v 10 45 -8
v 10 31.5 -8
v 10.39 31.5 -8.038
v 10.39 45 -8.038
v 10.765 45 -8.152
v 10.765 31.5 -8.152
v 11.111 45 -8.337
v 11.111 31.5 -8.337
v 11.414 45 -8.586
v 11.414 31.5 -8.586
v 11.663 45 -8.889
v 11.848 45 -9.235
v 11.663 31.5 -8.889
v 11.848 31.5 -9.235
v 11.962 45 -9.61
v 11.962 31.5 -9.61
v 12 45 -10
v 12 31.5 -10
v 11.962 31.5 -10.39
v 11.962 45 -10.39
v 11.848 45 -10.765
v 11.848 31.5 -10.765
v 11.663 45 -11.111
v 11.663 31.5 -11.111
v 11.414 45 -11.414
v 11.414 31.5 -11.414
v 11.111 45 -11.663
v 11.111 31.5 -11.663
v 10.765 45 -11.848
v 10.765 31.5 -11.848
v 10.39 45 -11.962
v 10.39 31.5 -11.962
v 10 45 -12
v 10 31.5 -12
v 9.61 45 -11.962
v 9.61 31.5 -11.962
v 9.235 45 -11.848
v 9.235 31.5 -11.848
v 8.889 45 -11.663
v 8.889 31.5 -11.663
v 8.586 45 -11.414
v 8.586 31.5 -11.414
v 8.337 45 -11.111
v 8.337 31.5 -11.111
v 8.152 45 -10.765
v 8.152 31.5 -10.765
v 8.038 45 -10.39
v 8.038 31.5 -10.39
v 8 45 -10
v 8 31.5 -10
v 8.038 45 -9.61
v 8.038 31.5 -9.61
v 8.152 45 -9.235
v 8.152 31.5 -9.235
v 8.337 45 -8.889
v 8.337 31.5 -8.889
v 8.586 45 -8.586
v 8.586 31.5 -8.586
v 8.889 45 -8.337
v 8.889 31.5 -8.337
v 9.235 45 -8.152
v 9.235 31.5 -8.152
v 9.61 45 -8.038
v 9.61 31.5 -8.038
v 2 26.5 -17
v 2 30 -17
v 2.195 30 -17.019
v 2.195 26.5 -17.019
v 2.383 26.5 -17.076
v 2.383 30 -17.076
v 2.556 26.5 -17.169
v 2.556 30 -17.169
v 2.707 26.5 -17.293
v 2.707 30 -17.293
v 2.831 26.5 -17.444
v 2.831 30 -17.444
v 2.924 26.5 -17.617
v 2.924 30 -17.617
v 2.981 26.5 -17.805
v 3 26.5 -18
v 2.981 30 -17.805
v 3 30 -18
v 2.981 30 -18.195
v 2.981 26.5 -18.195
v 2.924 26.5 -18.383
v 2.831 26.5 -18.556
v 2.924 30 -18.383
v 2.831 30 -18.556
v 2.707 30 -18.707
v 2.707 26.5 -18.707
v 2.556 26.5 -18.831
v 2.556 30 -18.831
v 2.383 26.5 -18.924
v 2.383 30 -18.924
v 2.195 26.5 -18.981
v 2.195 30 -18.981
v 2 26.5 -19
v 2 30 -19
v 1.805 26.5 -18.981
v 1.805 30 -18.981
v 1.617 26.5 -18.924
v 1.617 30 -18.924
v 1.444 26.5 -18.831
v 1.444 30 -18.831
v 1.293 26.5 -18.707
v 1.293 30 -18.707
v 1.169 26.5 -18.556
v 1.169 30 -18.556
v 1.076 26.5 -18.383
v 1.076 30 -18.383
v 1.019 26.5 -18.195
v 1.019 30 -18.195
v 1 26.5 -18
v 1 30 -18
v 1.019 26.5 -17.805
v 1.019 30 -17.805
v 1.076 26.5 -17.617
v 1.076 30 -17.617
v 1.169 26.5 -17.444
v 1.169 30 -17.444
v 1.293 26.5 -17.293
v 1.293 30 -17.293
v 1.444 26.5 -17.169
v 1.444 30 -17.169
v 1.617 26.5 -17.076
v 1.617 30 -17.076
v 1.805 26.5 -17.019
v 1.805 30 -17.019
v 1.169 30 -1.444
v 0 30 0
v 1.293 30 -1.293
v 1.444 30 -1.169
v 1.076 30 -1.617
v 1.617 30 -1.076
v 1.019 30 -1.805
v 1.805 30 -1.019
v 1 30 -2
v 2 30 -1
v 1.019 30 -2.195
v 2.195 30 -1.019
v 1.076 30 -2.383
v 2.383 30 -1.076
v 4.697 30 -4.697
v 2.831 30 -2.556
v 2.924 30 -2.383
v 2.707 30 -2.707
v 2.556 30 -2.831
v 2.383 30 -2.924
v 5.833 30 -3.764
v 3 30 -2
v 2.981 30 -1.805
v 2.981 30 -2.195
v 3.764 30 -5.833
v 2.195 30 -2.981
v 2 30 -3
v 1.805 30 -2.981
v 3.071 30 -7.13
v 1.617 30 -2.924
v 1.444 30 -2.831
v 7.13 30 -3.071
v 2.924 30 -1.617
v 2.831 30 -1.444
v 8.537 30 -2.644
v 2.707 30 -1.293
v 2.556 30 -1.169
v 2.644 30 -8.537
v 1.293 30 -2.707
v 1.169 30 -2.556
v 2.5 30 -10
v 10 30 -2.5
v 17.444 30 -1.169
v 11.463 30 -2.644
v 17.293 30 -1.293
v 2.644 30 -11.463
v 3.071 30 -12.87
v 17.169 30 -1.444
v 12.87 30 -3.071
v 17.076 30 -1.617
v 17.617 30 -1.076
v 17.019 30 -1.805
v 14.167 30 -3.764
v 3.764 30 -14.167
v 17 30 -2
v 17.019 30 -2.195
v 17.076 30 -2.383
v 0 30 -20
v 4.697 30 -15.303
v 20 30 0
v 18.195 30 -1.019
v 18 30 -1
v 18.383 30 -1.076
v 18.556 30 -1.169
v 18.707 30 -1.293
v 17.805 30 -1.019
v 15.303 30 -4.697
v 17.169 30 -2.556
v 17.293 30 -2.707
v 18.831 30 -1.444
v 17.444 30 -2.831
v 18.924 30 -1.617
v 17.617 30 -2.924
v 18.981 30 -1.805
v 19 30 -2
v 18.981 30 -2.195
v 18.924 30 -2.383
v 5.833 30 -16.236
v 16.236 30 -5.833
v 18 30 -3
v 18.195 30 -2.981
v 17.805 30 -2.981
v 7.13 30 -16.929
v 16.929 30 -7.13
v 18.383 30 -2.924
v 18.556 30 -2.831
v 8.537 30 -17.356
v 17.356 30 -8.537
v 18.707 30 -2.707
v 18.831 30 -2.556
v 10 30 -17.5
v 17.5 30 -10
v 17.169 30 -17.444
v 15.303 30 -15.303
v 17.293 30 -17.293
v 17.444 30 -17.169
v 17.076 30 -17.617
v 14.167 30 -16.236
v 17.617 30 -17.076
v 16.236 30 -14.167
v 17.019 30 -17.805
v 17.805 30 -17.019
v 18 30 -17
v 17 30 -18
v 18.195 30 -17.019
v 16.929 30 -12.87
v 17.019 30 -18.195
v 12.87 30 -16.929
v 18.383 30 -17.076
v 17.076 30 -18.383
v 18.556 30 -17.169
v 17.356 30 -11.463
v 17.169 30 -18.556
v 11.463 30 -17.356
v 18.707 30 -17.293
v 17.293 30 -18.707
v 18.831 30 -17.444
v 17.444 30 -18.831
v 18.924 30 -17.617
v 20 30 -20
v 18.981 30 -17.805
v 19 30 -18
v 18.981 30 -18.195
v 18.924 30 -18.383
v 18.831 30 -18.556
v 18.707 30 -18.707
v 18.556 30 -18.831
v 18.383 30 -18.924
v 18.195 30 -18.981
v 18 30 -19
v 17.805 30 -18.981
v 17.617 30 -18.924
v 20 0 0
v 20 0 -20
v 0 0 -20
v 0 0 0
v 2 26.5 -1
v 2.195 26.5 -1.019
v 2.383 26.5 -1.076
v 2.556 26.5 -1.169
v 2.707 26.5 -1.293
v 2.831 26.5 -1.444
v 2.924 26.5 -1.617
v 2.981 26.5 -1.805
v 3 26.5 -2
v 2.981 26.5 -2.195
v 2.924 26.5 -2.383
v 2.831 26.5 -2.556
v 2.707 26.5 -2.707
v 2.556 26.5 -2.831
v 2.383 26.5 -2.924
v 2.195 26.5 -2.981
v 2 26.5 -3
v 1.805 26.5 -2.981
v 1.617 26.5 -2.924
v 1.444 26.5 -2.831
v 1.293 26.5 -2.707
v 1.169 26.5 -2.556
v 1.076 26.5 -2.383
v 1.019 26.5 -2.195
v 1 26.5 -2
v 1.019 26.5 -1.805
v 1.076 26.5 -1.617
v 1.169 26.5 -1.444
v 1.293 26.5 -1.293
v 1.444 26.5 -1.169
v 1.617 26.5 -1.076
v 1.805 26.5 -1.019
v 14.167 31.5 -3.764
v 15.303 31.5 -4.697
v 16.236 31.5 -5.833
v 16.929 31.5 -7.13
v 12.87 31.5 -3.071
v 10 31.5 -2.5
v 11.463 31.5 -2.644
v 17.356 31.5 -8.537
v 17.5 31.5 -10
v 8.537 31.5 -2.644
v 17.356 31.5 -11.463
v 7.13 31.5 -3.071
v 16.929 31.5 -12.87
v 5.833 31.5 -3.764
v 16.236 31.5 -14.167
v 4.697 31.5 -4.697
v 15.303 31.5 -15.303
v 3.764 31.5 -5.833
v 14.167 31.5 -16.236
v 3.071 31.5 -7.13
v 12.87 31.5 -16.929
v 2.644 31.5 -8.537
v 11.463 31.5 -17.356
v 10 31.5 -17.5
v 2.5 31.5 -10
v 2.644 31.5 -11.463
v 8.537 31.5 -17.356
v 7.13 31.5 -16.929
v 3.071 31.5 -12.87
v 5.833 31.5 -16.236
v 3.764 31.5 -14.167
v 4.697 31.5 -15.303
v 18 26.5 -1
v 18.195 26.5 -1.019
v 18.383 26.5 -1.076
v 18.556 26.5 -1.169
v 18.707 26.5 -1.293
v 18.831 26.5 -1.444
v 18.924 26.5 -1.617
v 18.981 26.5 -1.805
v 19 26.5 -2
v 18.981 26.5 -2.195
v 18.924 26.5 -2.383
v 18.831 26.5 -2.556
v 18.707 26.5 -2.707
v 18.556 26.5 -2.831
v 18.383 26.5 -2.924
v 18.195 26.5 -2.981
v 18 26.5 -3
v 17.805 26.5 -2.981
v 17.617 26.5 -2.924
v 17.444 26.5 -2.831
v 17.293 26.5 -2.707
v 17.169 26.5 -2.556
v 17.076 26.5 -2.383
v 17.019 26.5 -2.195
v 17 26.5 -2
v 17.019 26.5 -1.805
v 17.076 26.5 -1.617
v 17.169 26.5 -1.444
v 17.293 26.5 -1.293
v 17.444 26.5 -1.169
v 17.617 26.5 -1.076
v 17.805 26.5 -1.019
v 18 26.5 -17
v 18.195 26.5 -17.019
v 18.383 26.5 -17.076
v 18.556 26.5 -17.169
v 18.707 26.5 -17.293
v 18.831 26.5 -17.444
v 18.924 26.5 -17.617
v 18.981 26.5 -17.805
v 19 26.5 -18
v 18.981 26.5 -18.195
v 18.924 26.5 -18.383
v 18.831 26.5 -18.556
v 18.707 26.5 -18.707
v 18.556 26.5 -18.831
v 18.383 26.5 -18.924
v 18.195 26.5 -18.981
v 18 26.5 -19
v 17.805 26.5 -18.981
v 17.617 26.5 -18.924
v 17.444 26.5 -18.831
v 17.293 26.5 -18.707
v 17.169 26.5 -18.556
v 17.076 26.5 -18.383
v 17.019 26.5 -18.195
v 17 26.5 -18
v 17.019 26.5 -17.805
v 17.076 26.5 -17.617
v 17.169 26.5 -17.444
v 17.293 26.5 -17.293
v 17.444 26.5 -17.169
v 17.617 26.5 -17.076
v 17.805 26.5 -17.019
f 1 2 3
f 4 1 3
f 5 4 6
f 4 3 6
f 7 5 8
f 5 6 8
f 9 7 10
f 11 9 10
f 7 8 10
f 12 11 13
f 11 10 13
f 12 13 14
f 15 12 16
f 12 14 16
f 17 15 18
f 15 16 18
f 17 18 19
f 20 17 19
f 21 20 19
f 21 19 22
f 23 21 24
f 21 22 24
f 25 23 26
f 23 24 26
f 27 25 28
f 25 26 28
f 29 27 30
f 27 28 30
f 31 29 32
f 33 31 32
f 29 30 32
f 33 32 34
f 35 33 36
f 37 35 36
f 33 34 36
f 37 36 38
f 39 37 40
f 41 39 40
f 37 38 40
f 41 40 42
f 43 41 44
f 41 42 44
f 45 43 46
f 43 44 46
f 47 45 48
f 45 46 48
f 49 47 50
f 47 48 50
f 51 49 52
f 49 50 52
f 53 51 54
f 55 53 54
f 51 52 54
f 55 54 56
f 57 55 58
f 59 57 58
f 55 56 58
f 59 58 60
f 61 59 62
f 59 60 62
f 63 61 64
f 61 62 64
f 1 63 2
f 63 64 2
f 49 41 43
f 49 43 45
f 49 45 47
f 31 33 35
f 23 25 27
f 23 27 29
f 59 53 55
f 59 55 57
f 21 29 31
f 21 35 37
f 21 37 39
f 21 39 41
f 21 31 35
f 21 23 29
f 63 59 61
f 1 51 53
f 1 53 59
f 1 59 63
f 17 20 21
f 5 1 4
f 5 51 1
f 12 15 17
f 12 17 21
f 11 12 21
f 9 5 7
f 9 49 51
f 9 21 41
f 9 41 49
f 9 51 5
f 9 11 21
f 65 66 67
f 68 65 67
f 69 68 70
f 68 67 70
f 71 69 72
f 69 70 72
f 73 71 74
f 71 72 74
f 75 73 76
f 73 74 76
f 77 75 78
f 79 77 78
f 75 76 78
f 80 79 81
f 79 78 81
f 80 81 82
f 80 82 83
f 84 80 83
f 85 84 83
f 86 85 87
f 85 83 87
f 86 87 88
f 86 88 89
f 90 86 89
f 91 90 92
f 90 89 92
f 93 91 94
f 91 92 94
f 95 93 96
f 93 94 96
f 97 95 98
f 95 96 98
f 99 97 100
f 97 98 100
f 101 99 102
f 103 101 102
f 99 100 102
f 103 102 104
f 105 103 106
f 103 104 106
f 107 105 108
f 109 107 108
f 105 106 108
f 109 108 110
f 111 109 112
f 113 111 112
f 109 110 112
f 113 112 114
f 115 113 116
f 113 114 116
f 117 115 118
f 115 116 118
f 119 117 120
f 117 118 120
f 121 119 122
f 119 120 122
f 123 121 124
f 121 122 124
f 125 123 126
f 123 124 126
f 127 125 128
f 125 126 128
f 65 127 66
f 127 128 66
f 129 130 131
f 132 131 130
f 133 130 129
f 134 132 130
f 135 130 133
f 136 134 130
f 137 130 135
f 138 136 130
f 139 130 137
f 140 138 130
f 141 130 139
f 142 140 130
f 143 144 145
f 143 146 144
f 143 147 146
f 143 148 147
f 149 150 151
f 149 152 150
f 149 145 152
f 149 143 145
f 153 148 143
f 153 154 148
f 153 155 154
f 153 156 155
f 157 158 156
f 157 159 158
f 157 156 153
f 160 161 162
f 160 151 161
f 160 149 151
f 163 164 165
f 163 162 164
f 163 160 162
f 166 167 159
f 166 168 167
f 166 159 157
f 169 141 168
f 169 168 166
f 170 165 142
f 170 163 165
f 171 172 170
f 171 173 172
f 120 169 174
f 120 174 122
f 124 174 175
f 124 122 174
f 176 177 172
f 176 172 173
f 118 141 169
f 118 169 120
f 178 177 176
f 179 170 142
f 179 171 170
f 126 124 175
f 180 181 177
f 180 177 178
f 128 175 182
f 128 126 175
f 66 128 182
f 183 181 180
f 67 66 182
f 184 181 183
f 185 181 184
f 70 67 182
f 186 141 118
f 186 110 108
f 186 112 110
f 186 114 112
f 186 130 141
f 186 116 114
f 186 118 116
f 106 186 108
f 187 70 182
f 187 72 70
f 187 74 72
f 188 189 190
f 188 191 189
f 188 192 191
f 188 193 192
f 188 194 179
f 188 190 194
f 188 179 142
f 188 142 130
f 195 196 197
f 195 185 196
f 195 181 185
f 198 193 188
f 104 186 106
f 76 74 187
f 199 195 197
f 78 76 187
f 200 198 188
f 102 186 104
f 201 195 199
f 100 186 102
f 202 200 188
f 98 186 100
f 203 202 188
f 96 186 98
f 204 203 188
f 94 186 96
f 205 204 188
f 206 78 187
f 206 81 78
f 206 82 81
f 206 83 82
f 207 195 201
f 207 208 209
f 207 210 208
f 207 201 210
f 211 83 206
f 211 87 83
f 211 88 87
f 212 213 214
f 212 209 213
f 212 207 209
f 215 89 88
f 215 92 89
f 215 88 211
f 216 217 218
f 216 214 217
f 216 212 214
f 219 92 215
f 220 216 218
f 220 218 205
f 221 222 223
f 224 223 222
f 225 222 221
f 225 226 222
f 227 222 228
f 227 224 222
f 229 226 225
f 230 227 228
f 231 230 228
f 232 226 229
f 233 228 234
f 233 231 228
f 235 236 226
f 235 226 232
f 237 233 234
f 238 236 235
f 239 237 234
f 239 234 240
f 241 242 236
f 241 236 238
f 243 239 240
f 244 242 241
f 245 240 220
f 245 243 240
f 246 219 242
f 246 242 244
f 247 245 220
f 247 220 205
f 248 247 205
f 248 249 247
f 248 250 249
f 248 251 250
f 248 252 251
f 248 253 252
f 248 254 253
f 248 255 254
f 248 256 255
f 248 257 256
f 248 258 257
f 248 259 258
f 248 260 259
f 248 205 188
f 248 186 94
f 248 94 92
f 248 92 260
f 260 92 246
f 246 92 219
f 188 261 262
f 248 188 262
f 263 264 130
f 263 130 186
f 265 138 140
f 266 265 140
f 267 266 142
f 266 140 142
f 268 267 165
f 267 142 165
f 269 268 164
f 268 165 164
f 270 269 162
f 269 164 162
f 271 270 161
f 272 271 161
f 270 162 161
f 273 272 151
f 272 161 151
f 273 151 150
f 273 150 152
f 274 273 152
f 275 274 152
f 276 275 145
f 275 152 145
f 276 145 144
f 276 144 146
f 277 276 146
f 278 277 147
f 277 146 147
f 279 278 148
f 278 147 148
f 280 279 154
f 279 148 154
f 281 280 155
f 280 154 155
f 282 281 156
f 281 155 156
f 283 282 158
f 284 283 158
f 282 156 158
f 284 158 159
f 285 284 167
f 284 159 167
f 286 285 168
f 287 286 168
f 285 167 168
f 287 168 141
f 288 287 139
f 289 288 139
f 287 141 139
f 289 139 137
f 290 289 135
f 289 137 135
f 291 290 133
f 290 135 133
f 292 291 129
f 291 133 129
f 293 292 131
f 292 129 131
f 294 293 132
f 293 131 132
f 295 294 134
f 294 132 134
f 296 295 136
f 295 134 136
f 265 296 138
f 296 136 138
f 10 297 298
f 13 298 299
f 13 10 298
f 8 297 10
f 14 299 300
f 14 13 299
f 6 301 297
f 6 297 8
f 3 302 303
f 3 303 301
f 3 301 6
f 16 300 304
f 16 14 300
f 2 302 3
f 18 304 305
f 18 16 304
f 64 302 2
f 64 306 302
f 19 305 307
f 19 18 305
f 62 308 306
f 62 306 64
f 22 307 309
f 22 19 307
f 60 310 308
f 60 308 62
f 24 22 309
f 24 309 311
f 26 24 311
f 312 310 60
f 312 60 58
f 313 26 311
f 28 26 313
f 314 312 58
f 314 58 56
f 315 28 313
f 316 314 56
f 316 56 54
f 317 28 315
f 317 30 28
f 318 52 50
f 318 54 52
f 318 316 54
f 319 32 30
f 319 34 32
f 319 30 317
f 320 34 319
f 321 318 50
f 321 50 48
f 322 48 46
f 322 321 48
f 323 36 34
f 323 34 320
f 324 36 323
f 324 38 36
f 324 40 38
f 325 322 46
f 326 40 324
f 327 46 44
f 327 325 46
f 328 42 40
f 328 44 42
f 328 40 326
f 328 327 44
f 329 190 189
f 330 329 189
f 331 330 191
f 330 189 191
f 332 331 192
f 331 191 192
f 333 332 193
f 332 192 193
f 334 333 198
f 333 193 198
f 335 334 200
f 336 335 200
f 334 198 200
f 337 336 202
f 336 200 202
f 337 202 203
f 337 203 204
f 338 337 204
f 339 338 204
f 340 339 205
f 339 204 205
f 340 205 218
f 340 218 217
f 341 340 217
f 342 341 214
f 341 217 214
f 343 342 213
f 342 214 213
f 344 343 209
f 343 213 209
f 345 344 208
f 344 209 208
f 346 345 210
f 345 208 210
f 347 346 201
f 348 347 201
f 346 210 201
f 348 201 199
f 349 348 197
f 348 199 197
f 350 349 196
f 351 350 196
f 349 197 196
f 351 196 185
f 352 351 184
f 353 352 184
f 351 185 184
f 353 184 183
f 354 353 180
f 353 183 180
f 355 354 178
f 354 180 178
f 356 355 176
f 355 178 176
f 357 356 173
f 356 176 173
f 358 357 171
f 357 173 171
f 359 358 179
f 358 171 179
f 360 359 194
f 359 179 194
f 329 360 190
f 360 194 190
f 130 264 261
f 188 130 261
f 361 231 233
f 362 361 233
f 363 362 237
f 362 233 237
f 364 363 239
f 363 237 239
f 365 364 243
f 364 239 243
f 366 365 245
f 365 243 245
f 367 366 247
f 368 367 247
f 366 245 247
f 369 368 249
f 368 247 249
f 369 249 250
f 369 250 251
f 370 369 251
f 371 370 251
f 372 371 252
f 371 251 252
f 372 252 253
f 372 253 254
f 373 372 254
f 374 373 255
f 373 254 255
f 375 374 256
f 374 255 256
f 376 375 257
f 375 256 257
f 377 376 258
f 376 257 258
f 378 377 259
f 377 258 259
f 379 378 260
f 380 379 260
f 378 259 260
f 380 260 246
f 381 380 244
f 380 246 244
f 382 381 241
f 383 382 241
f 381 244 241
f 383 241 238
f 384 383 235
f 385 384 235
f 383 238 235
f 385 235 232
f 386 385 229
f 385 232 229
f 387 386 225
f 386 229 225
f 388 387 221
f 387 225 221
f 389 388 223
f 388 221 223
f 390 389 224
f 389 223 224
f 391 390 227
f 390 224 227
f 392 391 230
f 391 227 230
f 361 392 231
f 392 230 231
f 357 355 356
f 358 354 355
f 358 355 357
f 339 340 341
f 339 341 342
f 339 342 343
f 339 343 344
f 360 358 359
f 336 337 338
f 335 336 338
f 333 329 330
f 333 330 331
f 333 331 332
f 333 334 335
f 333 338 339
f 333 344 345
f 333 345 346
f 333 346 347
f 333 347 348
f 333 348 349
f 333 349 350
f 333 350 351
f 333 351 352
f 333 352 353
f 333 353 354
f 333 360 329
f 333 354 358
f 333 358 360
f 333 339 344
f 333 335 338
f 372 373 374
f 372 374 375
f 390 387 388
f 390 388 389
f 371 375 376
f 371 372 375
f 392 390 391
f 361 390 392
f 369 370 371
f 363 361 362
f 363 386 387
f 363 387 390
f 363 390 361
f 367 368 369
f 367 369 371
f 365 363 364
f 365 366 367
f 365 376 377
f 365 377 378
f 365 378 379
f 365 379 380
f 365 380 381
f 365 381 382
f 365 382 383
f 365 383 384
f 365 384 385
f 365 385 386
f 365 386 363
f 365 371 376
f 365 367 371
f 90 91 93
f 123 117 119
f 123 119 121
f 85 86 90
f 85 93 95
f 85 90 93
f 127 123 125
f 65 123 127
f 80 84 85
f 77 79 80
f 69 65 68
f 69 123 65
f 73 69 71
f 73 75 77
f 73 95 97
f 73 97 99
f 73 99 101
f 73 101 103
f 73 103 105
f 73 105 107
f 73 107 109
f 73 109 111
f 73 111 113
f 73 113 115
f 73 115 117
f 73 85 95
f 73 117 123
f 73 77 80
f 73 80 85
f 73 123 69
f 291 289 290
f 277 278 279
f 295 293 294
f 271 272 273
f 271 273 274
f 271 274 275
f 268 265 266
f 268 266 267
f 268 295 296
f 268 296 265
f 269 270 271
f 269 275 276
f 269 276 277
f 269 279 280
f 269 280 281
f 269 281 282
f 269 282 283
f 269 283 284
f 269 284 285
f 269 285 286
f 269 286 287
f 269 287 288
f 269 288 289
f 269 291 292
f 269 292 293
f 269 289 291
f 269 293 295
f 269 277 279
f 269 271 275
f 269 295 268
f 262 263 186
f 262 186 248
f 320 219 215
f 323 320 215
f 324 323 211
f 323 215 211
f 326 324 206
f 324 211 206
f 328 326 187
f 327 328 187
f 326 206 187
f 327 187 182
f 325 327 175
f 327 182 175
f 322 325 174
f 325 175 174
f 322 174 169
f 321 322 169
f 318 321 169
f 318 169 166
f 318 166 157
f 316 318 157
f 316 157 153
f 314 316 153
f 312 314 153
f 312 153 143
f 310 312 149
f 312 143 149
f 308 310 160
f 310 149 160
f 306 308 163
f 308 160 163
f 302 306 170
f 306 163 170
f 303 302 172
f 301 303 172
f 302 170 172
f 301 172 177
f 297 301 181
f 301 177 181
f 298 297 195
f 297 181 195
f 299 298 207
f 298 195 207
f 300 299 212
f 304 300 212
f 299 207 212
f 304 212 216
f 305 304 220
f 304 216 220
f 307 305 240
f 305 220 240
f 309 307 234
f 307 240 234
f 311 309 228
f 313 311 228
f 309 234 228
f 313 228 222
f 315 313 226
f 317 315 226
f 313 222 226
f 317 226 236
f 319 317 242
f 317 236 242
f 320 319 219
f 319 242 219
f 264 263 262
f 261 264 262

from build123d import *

# Parameters (mm, degrees)
SKETCH1_W           = 20
SKETCH1_H           = 20
BOSS_EXTRUDE1_DEPTH = 30
SKETCH2_R           = 1
CUT_EXTRUDE1_DEPTH  = 3.5
SKETCH3_R           = 7.5
BOSS_EXTRUDE2_DEPTH = 1.5
SKETCH4_R           = 2
BOSS_EXTRUDE3_DEPTH = 13.5


with BuildPart() as part:
    # Sketch1 → Boss-Extrude1 (new body)
    with BuildSketch(Plane(origin=(0, 0, 0), x_dir=(1, 0, 0), z_dir=(0, 1, 0))):
        with Locations((10, 10)):
            Rectangle(SKETCH1_W, SKETCH1_H)
    extrude(amount=BOSS_EXTRUDE1_DEPTH)

    # Sketch2 → Cut-Extrude1 (cut)
    with BuildSketch(Plane(origin=(0, 30, 0), x_dir=(1, 0, 0), z_dir=(0, 1, 0))):
        with Locations(Location((2, 18, 0), (0, 0, 270))):
            Circle(SKETCH2_R)
        with Locations(Location((18, 18, 0), (0, 0, 270))):
            Circle(SKETCH2_R)
        with Locations(Location((18, 2, 0), (0, 0, 270))):
            Circle(SKETCH2_R)
        with Locations(Location((2, 2, 0), (0, 0, 270))):
            Circle(SKETCH2_R)
    extrude(amount=-CUT_EXTRUDE1_DEPTH, mode=Mode.SUBTRACT)

    # Sketch3 → Boss-Extrude2 (add)
    with BuildSketch(Plane(origin=(0, 30, 0), x_dir=(1, 0, 0), z_dir=(0, 1, 0))):
        with Locations(Location((10, 10, 0), (0, 0, 90))):
            Circle(SKETCH3_R)
    extrude(amount=BOSS_EXTRUDE2_DEPTH)

    # Sketch4 → Boss-Extrude3 (add)
    with BuildSketch(Plane(origin=(0, 31.5, 0), x_dir=(1, 0, 0), z_dir=(0, 1, 0))):
        with Locations(Location((10, 10, 0), (0, 0, 270))):
            Circle(SKETCH4_R)
    extrude(amount=BOSS_EXTRUDE3_DEPTH)


solid = part.part
